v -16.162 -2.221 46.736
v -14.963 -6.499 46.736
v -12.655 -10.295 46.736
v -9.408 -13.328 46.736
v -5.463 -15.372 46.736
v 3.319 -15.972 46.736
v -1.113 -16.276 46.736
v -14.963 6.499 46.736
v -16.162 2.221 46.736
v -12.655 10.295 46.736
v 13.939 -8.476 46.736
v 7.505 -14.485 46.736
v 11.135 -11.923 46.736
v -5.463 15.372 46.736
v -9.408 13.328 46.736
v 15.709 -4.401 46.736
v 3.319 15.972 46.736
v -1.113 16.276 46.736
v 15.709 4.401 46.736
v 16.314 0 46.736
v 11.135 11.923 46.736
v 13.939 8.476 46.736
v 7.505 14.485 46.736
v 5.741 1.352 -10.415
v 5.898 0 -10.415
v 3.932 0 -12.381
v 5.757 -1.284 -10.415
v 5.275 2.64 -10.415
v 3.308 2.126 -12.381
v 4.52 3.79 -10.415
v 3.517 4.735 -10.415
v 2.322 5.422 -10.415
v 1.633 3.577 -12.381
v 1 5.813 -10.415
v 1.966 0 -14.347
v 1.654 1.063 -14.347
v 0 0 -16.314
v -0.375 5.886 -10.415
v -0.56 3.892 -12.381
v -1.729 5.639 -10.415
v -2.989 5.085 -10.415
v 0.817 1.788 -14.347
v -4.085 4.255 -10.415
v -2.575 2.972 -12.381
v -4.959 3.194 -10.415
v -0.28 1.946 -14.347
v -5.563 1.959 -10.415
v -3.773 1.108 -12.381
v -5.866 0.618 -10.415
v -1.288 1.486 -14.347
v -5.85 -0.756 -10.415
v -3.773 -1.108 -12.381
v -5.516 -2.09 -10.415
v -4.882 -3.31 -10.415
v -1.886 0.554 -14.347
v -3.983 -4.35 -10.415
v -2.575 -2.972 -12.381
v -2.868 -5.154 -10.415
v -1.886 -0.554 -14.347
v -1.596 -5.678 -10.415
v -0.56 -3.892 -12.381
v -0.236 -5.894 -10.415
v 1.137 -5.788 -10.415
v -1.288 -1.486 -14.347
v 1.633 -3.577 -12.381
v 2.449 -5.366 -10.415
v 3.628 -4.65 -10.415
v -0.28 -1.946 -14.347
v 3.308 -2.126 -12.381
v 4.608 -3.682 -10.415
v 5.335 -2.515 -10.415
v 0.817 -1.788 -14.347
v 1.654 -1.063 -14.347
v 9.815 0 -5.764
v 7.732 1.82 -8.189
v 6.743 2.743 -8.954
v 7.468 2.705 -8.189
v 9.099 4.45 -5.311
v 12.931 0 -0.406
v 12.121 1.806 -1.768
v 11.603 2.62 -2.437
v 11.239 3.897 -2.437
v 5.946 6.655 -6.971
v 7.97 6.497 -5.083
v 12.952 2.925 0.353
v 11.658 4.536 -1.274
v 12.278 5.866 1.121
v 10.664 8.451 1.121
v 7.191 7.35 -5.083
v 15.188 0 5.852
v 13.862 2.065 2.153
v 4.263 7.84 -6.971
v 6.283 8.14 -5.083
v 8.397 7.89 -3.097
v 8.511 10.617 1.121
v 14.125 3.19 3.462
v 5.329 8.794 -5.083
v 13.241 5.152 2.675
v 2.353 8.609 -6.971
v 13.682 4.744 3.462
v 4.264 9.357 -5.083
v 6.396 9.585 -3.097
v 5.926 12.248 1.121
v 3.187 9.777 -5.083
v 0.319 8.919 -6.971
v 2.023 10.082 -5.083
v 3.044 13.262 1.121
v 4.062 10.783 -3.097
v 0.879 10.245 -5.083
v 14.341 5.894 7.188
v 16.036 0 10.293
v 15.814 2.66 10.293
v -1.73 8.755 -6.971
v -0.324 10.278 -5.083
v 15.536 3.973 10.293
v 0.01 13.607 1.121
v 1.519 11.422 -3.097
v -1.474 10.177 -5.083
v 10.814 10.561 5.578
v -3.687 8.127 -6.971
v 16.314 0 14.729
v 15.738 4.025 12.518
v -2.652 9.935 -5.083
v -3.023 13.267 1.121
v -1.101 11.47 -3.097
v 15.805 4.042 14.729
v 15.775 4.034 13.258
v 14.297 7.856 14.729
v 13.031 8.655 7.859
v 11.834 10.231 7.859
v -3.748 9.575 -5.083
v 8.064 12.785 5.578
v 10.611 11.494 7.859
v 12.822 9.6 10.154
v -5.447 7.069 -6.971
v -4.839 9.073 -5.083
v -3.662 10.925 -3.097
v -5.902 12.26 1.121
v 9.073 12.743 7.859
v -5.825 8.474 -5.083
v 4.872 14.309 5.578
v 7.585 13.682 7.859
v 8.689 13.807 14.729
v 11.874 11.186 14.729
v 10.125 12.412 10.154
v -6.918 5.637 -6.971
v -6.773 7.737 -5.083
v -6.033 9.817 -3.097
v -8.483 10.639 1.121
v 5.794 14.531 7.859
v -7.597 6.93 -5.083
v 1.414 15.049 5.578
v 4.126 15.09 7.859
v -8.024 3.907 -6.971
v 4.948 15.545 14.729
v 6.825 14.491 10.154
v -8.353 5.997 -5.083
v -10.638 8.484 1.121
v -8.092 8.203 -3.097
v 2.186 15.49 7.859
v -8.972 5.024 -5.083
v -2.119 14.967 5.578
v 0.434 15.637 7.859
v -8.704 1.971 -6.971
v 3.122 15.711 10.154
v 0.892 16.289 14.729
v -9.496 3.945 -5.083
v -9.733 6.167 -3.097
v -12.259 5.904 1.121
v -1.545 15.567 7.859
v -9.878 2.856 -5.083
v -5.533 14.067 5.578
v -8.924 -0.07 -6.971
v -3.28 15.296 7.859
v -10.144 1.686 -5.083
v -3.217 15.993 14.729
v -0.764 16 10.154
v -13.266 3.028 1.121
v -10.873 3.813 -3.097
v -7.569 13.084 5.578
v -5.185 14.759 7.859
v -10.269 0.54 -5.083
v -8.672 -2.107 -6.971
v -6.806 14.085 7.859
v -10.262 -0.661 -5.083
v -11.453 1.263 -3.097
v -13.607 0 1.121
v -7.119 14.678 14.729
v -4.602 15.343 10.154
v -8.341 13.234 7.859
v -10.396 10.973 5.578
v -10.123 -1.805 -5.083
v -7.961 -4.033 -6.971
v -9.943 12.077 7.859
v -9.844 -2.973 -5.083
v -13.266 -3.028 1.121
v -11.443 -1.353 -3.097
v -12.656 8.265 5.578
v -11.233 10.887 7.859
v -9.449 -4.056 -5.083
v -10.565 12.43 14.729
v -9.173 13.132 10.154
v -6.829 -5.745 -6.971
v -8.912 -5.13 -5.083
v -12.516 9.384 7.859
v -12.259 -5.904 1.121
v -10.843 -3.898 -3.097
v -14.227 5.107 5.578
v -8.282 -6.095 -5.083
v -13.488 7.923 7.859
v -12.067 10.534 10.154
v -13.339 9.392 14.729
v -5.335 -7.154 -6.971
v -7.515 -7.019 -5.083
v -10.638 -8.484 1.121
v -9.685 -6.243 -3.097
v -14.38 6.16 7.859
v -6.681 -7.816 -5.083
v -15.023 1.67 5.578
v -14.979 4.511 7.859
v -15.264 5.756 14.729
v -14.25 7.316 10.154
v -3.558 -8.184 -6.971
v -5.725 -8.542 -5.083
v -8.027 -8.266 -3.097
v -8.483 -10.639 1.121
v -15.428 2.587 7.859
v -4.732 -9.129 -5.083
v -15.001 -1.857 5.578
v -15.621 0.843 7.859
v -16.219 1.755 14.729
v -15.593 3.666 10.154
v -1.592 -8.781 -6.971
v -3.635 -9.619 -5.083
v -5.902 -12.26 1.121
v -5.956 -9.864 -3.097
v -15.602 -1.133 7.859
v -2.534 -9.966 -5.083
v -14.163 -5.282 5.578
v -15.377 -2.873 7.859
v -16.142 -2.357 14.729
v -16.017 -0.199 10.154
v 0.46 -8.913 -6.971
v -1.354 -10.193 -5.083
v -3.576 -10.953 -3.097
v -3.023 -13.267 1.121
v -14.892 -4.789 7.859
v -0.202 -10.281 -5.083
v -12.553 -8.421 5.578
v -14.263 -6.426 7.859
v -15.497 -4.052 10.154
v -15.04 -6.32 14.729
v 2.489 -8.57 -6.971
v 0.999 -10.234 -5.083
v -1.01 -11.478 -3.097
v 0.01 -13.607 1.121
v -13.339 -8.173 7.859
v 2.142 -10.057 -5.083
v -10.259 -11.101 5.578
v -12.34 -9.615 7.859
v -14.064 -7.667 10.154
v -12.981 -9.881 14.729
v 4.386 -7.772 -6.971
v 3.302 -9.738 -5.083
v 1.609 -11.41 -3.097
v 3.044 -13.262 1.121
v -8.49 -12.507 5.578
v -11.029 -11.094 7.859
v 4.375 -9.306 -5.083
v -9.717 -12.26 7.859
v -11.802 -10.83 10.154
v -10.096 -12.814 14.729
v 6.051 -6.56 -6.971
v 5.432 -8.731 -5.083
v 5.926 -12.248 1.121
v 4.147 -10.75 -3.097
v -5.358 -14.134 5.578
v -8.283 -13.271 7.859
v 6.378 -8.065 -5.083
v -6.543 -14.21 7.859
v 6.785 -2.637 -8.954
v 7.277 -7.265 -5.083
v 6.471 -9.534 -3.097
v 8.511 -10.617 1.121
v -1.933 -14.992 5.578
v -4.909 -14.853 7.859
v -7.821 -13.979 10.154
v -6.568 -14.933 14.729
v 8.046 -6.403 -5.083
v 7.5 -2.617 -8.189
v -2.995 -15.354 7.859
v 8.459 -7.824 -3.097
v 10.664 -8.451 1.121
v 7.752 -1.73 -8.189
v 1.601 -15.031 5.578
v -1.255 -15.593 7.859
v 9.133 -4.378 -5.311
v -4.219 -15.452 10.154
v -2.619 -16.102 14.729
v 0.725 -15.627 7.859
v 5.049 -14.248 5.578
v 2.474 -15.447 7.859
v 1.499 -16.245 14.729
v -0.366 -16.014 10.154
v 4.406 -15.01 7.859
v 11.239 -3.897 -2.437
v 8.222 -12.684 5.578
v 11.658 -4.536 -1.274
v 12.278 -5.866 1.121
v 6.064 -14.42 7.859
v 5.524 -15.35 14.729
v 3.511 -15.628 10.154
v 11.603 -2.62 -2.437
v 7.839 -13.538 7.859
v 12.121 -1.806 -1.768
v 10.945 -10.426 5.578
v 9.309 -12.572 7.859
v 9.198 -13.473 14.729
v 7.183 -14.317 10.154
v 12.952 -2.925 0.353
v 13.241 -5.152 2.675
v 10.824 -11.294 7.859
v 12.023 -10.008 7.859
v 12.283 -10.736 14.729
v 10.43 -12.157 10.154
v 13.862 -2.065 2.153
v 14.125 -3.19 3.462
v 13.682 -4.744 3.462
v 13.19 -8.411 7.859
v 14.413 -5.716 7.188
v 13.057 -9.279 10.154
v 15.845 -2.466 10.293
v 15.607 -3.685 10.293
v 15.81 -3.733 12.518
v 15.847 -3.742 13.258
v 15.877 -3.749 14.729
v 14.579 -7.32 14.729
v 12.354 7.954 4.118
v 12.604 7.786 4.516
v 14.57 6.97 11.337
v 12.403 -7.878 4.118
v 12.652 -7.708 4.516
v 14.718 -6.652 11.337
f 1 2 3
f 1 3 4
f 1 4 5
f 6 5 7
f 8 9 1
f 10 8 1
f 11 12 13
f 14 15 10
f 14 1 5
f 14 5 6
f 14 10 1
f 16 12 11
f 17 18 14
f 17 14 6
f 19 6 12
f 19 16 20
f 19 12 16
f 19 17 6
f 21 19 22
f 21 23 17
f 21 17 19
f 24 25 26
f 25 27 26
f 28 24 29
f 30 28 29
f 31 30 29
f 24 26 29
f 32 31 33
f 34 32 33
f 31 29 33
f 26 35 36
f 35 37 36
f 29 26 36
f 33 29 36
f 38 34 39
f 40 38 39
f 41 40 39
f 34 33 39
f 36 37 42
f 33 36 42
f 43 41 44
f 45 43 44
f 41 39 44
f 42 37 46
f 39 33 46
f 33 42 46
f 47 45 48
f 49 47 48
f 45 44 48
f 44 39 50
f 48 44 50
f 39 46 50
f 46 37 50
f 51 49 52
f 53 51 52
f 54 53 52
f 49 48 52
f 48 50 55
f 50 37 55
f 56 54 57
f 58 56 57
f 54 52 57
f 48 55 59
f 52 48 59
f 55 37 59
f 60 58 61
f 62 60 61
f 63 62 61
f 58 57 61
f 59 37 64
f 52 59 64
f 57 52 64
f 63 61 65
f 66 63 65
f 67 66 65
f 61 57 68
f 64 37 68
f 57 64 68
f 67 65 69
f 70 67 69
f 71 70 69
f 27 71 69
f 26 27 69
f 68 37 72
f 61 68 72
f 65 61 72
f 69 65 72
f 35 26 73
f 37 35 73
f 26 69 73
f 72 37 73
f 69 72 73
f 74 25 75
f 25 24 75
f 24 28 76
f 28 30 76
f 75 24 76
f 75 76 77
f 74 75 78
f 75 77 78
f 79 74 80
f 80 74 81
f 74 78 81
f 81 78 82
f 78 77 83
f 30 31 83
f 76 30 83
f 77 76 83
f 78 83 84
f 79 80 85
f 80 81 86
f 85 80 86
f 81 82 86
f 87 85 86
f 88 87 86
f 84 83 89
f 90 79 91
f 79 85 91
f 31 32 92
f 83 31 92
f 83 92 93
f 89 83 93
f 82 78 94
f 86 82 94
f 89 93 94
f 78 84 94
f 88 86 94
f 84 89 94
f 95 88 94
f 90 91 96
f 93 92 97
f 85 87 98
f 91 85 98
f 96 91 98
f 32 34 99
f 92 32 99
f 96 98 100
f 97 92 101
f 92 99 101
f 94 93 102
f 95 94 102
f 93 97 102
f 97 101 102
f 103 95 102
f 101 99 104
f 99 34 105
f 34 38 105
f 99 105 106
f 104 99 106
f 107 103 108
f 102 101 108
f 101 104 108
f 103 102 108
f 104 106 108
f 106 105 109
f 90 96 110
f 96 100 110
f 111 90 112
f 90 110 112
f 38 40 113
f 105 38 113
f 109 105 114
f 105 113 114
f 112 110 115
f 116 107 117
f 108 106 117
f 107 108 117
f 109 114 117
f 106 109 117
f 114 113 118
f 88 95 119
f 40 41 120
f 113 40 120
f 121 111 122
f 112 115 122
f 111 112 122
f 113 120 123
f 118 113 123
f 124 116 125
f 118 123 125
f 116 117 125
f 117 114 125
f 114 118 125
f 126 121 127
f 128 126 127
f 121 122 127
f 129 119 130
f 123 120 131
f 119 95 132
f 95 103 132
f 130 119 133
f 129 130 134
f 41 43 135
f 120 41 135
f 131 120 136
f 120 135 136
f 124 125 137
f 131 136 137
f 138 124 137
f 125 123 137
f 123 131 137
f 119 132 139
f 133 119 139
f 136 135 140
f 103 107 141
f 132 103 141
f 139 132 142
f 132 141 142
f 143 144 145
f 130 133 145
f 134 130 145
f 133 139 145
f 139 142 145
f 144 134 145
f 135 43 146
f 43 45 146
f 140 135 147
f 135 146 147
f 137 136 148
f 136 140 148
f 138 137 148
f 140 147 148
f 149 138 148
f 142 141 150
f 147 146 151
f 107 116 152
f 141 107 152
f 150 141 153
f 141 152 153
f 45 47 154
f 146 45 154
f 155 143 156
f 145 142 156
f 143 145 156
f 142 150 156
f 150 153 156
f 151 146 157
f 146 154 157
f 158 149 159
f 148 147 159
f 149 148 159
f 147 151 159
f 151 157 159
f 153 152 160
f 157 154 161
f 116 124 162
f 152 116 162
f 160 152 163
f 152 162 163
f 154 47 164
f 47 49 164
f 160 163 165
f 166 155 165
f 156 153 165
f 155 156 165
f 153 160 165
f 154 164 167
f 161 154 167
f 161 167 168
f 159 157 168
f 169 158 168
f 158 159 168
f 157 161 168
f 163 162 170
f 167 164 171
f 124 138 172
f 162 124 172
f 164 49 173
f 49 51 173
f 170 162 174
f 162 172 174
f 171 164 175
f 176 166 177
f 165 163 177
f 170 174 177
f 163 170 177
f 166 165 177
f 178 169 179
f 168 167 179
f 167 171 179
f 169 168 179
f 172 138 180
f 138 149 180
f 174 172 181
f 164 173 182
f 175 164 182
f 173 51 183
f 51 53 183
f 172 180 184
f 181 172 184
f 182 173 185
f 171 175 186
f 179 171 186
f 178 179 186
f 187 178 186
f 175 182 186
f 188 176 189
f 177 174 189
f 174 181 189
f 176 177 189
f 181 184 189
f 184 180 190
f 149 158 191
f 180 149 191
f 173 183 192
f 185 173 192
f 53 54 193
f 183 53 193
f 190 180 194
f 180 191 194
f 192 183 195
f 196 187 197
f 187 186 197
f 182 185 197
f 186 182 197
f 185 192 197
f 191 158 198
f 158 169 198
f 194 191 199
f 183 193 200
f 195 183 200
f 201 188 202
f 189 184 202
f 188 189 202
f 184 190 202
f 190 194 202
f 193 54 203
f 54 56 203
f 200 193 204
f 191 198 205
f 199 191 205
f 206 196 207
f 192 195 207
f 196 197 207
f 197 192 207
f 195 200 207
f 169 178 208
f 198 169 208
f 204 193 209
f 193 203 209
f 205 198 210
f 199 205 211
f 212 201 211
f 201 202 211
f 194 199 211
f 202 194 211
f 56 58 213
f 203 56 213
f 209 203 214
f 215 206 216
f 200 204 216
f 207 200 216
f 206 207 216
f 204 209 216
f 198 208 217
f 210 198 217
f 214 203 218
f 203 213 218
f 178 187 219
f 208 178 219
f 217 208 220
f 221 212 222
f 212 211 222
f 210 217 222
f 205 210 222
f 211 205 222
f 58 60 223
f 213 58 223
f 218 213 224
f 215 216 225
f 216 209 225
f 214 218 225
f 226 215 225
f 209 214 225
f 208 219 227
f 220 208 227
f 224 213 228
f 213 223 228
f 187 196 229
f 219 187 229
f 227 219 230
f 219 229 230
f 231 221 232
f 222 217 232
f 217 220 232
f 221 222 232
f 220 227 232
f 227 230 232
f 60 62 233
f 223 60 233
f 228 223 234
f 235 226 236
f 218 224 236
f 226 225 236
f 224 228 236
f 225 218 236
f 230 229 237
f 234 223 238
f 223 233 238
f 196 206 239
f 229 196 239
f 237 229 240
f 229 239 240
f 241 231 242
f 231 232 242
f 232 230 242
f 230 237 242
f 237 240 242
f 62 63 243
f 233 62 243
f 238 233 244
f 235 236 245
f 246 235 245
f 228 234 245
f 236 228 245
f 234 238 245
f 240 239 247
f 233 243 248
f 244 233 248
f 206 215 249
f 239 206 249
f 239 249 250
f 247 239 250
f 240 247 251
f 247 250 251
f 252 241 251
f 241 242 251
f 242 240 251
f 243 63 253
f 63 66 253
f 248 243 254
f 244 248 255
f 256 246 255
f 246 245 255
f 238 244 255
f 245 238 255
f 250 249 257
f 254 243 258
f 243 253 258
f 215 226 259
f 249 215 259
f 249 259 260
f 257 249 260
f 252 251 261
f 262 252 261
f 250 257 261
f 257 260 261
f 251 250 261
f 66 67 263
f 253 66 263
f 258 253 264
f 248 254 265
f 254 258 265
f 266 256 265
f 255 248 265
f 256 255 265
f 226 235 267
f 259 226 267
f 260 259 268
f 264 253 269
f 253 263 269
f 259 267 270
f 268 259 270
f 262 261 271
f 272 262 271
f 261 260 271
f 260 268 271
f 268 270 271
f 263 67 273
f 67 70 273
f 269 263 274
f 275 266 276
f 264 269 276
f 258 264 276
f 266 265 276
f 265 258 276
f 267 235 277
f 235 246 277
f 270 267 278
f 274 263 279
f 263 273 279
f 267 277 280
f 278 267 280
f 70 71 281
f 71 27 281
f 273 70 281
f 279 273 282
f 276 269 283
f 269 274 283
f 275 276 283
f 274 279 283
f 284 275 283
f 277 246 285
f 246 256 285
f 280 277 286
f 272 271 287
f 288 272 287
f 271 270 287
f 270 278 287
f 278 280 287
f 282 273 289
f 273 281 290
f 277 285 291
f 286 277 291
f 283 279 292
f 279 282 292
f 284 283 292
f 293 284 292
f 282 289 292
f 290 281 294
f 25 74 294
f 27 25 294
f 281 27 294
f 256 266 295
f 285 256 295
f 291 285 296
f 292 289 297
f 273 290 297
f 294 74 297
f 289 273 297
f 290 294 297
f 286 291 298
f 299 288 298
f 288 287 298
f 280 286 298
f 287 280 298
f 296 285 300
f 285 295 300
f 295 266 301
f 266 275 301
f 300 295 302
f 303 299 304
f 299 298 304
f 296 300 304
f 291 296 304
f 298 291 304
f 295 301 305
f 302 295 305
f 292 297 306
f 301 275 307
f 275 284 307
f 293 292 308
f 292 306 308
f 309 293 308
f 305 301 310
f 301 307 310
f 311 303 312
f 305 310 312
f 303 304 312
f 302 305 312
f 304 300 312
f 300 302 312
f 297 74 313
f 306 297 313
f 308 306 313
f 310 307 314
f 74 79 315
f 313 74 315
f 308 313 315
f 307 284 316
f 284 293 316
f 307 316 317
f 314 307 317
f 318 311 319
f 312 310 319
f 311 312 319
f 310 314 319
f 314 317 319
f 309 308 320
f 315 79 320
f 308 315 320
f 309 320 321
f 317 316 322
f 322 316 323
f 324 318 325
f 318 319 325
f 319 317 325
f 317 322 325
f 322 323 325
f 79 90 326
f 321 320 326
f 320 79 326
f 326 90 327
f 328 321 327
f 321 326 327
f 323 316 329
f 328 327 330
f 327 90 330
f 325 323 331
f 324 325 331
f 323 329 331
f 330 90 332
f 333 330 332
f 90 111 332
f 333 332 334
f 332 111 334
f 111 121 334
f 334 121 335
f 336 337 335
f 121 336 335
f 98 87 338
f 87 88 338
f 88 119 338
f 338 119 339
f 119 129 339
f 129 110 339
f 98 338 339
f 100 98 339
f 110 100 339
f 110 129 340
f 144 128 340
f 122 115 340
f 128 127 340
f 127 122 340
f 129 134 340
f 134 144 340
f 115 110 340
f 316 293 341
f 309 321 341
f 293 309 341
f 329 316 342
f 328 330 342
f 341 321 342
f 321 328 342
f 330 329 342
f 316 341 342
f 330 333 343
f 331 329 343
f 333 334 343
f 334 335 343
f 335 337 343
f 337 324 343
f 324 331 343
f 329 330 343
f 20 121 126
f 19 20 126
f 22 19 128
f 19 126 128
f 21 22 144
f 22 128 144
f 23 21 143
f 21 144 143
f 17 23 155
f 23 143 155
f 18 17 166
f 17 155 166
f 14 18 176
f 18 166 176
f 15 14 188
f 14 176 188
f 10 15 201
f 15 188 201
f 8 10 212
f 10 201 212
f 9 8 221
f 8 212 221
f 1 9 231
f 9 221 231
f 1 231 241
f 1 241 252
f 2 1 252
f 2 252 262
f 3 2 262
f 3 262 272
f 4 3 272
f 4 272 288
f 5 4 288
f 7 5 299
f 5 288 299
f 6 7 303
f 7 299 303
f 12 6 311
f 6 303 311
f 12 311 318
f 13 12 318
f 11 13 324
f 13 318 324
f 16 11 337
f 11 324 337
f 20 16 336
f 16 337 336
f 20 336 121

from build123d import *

# Parameters (mm, degrees)
F1_R     = 16.3135462342
F2_DEPTH = 46.736
F4_R     = 35.56


# Not quite as in the source:
# - an extrude whose draft closes it to a point is written as a loft to that point


with BuildPart() as f2:
    # F1 (on face) → F2 (new body)
    with BuildSketch(Plane.XY):
        Circle(F1_R)
    extrude(amount=F2_DEPTH)

    # F1 (on face) → F3 section 0
    with BuildSketch(Plane.XY, mode=Mode.PRIVATE) as f3_s0:
        Circle(F1_R)
    loft([f3_s0.sketch, Vertex(0, 0, -16.3135462342)], ruled=True)

    # F4
    f4_edges = [f2.edges().sort_by_distance(p)[0] for p in [
        (-16.313546, 0, 0),
    ]]
    fillet(f4_edges, radius=F4_R)


solid = f2.part
